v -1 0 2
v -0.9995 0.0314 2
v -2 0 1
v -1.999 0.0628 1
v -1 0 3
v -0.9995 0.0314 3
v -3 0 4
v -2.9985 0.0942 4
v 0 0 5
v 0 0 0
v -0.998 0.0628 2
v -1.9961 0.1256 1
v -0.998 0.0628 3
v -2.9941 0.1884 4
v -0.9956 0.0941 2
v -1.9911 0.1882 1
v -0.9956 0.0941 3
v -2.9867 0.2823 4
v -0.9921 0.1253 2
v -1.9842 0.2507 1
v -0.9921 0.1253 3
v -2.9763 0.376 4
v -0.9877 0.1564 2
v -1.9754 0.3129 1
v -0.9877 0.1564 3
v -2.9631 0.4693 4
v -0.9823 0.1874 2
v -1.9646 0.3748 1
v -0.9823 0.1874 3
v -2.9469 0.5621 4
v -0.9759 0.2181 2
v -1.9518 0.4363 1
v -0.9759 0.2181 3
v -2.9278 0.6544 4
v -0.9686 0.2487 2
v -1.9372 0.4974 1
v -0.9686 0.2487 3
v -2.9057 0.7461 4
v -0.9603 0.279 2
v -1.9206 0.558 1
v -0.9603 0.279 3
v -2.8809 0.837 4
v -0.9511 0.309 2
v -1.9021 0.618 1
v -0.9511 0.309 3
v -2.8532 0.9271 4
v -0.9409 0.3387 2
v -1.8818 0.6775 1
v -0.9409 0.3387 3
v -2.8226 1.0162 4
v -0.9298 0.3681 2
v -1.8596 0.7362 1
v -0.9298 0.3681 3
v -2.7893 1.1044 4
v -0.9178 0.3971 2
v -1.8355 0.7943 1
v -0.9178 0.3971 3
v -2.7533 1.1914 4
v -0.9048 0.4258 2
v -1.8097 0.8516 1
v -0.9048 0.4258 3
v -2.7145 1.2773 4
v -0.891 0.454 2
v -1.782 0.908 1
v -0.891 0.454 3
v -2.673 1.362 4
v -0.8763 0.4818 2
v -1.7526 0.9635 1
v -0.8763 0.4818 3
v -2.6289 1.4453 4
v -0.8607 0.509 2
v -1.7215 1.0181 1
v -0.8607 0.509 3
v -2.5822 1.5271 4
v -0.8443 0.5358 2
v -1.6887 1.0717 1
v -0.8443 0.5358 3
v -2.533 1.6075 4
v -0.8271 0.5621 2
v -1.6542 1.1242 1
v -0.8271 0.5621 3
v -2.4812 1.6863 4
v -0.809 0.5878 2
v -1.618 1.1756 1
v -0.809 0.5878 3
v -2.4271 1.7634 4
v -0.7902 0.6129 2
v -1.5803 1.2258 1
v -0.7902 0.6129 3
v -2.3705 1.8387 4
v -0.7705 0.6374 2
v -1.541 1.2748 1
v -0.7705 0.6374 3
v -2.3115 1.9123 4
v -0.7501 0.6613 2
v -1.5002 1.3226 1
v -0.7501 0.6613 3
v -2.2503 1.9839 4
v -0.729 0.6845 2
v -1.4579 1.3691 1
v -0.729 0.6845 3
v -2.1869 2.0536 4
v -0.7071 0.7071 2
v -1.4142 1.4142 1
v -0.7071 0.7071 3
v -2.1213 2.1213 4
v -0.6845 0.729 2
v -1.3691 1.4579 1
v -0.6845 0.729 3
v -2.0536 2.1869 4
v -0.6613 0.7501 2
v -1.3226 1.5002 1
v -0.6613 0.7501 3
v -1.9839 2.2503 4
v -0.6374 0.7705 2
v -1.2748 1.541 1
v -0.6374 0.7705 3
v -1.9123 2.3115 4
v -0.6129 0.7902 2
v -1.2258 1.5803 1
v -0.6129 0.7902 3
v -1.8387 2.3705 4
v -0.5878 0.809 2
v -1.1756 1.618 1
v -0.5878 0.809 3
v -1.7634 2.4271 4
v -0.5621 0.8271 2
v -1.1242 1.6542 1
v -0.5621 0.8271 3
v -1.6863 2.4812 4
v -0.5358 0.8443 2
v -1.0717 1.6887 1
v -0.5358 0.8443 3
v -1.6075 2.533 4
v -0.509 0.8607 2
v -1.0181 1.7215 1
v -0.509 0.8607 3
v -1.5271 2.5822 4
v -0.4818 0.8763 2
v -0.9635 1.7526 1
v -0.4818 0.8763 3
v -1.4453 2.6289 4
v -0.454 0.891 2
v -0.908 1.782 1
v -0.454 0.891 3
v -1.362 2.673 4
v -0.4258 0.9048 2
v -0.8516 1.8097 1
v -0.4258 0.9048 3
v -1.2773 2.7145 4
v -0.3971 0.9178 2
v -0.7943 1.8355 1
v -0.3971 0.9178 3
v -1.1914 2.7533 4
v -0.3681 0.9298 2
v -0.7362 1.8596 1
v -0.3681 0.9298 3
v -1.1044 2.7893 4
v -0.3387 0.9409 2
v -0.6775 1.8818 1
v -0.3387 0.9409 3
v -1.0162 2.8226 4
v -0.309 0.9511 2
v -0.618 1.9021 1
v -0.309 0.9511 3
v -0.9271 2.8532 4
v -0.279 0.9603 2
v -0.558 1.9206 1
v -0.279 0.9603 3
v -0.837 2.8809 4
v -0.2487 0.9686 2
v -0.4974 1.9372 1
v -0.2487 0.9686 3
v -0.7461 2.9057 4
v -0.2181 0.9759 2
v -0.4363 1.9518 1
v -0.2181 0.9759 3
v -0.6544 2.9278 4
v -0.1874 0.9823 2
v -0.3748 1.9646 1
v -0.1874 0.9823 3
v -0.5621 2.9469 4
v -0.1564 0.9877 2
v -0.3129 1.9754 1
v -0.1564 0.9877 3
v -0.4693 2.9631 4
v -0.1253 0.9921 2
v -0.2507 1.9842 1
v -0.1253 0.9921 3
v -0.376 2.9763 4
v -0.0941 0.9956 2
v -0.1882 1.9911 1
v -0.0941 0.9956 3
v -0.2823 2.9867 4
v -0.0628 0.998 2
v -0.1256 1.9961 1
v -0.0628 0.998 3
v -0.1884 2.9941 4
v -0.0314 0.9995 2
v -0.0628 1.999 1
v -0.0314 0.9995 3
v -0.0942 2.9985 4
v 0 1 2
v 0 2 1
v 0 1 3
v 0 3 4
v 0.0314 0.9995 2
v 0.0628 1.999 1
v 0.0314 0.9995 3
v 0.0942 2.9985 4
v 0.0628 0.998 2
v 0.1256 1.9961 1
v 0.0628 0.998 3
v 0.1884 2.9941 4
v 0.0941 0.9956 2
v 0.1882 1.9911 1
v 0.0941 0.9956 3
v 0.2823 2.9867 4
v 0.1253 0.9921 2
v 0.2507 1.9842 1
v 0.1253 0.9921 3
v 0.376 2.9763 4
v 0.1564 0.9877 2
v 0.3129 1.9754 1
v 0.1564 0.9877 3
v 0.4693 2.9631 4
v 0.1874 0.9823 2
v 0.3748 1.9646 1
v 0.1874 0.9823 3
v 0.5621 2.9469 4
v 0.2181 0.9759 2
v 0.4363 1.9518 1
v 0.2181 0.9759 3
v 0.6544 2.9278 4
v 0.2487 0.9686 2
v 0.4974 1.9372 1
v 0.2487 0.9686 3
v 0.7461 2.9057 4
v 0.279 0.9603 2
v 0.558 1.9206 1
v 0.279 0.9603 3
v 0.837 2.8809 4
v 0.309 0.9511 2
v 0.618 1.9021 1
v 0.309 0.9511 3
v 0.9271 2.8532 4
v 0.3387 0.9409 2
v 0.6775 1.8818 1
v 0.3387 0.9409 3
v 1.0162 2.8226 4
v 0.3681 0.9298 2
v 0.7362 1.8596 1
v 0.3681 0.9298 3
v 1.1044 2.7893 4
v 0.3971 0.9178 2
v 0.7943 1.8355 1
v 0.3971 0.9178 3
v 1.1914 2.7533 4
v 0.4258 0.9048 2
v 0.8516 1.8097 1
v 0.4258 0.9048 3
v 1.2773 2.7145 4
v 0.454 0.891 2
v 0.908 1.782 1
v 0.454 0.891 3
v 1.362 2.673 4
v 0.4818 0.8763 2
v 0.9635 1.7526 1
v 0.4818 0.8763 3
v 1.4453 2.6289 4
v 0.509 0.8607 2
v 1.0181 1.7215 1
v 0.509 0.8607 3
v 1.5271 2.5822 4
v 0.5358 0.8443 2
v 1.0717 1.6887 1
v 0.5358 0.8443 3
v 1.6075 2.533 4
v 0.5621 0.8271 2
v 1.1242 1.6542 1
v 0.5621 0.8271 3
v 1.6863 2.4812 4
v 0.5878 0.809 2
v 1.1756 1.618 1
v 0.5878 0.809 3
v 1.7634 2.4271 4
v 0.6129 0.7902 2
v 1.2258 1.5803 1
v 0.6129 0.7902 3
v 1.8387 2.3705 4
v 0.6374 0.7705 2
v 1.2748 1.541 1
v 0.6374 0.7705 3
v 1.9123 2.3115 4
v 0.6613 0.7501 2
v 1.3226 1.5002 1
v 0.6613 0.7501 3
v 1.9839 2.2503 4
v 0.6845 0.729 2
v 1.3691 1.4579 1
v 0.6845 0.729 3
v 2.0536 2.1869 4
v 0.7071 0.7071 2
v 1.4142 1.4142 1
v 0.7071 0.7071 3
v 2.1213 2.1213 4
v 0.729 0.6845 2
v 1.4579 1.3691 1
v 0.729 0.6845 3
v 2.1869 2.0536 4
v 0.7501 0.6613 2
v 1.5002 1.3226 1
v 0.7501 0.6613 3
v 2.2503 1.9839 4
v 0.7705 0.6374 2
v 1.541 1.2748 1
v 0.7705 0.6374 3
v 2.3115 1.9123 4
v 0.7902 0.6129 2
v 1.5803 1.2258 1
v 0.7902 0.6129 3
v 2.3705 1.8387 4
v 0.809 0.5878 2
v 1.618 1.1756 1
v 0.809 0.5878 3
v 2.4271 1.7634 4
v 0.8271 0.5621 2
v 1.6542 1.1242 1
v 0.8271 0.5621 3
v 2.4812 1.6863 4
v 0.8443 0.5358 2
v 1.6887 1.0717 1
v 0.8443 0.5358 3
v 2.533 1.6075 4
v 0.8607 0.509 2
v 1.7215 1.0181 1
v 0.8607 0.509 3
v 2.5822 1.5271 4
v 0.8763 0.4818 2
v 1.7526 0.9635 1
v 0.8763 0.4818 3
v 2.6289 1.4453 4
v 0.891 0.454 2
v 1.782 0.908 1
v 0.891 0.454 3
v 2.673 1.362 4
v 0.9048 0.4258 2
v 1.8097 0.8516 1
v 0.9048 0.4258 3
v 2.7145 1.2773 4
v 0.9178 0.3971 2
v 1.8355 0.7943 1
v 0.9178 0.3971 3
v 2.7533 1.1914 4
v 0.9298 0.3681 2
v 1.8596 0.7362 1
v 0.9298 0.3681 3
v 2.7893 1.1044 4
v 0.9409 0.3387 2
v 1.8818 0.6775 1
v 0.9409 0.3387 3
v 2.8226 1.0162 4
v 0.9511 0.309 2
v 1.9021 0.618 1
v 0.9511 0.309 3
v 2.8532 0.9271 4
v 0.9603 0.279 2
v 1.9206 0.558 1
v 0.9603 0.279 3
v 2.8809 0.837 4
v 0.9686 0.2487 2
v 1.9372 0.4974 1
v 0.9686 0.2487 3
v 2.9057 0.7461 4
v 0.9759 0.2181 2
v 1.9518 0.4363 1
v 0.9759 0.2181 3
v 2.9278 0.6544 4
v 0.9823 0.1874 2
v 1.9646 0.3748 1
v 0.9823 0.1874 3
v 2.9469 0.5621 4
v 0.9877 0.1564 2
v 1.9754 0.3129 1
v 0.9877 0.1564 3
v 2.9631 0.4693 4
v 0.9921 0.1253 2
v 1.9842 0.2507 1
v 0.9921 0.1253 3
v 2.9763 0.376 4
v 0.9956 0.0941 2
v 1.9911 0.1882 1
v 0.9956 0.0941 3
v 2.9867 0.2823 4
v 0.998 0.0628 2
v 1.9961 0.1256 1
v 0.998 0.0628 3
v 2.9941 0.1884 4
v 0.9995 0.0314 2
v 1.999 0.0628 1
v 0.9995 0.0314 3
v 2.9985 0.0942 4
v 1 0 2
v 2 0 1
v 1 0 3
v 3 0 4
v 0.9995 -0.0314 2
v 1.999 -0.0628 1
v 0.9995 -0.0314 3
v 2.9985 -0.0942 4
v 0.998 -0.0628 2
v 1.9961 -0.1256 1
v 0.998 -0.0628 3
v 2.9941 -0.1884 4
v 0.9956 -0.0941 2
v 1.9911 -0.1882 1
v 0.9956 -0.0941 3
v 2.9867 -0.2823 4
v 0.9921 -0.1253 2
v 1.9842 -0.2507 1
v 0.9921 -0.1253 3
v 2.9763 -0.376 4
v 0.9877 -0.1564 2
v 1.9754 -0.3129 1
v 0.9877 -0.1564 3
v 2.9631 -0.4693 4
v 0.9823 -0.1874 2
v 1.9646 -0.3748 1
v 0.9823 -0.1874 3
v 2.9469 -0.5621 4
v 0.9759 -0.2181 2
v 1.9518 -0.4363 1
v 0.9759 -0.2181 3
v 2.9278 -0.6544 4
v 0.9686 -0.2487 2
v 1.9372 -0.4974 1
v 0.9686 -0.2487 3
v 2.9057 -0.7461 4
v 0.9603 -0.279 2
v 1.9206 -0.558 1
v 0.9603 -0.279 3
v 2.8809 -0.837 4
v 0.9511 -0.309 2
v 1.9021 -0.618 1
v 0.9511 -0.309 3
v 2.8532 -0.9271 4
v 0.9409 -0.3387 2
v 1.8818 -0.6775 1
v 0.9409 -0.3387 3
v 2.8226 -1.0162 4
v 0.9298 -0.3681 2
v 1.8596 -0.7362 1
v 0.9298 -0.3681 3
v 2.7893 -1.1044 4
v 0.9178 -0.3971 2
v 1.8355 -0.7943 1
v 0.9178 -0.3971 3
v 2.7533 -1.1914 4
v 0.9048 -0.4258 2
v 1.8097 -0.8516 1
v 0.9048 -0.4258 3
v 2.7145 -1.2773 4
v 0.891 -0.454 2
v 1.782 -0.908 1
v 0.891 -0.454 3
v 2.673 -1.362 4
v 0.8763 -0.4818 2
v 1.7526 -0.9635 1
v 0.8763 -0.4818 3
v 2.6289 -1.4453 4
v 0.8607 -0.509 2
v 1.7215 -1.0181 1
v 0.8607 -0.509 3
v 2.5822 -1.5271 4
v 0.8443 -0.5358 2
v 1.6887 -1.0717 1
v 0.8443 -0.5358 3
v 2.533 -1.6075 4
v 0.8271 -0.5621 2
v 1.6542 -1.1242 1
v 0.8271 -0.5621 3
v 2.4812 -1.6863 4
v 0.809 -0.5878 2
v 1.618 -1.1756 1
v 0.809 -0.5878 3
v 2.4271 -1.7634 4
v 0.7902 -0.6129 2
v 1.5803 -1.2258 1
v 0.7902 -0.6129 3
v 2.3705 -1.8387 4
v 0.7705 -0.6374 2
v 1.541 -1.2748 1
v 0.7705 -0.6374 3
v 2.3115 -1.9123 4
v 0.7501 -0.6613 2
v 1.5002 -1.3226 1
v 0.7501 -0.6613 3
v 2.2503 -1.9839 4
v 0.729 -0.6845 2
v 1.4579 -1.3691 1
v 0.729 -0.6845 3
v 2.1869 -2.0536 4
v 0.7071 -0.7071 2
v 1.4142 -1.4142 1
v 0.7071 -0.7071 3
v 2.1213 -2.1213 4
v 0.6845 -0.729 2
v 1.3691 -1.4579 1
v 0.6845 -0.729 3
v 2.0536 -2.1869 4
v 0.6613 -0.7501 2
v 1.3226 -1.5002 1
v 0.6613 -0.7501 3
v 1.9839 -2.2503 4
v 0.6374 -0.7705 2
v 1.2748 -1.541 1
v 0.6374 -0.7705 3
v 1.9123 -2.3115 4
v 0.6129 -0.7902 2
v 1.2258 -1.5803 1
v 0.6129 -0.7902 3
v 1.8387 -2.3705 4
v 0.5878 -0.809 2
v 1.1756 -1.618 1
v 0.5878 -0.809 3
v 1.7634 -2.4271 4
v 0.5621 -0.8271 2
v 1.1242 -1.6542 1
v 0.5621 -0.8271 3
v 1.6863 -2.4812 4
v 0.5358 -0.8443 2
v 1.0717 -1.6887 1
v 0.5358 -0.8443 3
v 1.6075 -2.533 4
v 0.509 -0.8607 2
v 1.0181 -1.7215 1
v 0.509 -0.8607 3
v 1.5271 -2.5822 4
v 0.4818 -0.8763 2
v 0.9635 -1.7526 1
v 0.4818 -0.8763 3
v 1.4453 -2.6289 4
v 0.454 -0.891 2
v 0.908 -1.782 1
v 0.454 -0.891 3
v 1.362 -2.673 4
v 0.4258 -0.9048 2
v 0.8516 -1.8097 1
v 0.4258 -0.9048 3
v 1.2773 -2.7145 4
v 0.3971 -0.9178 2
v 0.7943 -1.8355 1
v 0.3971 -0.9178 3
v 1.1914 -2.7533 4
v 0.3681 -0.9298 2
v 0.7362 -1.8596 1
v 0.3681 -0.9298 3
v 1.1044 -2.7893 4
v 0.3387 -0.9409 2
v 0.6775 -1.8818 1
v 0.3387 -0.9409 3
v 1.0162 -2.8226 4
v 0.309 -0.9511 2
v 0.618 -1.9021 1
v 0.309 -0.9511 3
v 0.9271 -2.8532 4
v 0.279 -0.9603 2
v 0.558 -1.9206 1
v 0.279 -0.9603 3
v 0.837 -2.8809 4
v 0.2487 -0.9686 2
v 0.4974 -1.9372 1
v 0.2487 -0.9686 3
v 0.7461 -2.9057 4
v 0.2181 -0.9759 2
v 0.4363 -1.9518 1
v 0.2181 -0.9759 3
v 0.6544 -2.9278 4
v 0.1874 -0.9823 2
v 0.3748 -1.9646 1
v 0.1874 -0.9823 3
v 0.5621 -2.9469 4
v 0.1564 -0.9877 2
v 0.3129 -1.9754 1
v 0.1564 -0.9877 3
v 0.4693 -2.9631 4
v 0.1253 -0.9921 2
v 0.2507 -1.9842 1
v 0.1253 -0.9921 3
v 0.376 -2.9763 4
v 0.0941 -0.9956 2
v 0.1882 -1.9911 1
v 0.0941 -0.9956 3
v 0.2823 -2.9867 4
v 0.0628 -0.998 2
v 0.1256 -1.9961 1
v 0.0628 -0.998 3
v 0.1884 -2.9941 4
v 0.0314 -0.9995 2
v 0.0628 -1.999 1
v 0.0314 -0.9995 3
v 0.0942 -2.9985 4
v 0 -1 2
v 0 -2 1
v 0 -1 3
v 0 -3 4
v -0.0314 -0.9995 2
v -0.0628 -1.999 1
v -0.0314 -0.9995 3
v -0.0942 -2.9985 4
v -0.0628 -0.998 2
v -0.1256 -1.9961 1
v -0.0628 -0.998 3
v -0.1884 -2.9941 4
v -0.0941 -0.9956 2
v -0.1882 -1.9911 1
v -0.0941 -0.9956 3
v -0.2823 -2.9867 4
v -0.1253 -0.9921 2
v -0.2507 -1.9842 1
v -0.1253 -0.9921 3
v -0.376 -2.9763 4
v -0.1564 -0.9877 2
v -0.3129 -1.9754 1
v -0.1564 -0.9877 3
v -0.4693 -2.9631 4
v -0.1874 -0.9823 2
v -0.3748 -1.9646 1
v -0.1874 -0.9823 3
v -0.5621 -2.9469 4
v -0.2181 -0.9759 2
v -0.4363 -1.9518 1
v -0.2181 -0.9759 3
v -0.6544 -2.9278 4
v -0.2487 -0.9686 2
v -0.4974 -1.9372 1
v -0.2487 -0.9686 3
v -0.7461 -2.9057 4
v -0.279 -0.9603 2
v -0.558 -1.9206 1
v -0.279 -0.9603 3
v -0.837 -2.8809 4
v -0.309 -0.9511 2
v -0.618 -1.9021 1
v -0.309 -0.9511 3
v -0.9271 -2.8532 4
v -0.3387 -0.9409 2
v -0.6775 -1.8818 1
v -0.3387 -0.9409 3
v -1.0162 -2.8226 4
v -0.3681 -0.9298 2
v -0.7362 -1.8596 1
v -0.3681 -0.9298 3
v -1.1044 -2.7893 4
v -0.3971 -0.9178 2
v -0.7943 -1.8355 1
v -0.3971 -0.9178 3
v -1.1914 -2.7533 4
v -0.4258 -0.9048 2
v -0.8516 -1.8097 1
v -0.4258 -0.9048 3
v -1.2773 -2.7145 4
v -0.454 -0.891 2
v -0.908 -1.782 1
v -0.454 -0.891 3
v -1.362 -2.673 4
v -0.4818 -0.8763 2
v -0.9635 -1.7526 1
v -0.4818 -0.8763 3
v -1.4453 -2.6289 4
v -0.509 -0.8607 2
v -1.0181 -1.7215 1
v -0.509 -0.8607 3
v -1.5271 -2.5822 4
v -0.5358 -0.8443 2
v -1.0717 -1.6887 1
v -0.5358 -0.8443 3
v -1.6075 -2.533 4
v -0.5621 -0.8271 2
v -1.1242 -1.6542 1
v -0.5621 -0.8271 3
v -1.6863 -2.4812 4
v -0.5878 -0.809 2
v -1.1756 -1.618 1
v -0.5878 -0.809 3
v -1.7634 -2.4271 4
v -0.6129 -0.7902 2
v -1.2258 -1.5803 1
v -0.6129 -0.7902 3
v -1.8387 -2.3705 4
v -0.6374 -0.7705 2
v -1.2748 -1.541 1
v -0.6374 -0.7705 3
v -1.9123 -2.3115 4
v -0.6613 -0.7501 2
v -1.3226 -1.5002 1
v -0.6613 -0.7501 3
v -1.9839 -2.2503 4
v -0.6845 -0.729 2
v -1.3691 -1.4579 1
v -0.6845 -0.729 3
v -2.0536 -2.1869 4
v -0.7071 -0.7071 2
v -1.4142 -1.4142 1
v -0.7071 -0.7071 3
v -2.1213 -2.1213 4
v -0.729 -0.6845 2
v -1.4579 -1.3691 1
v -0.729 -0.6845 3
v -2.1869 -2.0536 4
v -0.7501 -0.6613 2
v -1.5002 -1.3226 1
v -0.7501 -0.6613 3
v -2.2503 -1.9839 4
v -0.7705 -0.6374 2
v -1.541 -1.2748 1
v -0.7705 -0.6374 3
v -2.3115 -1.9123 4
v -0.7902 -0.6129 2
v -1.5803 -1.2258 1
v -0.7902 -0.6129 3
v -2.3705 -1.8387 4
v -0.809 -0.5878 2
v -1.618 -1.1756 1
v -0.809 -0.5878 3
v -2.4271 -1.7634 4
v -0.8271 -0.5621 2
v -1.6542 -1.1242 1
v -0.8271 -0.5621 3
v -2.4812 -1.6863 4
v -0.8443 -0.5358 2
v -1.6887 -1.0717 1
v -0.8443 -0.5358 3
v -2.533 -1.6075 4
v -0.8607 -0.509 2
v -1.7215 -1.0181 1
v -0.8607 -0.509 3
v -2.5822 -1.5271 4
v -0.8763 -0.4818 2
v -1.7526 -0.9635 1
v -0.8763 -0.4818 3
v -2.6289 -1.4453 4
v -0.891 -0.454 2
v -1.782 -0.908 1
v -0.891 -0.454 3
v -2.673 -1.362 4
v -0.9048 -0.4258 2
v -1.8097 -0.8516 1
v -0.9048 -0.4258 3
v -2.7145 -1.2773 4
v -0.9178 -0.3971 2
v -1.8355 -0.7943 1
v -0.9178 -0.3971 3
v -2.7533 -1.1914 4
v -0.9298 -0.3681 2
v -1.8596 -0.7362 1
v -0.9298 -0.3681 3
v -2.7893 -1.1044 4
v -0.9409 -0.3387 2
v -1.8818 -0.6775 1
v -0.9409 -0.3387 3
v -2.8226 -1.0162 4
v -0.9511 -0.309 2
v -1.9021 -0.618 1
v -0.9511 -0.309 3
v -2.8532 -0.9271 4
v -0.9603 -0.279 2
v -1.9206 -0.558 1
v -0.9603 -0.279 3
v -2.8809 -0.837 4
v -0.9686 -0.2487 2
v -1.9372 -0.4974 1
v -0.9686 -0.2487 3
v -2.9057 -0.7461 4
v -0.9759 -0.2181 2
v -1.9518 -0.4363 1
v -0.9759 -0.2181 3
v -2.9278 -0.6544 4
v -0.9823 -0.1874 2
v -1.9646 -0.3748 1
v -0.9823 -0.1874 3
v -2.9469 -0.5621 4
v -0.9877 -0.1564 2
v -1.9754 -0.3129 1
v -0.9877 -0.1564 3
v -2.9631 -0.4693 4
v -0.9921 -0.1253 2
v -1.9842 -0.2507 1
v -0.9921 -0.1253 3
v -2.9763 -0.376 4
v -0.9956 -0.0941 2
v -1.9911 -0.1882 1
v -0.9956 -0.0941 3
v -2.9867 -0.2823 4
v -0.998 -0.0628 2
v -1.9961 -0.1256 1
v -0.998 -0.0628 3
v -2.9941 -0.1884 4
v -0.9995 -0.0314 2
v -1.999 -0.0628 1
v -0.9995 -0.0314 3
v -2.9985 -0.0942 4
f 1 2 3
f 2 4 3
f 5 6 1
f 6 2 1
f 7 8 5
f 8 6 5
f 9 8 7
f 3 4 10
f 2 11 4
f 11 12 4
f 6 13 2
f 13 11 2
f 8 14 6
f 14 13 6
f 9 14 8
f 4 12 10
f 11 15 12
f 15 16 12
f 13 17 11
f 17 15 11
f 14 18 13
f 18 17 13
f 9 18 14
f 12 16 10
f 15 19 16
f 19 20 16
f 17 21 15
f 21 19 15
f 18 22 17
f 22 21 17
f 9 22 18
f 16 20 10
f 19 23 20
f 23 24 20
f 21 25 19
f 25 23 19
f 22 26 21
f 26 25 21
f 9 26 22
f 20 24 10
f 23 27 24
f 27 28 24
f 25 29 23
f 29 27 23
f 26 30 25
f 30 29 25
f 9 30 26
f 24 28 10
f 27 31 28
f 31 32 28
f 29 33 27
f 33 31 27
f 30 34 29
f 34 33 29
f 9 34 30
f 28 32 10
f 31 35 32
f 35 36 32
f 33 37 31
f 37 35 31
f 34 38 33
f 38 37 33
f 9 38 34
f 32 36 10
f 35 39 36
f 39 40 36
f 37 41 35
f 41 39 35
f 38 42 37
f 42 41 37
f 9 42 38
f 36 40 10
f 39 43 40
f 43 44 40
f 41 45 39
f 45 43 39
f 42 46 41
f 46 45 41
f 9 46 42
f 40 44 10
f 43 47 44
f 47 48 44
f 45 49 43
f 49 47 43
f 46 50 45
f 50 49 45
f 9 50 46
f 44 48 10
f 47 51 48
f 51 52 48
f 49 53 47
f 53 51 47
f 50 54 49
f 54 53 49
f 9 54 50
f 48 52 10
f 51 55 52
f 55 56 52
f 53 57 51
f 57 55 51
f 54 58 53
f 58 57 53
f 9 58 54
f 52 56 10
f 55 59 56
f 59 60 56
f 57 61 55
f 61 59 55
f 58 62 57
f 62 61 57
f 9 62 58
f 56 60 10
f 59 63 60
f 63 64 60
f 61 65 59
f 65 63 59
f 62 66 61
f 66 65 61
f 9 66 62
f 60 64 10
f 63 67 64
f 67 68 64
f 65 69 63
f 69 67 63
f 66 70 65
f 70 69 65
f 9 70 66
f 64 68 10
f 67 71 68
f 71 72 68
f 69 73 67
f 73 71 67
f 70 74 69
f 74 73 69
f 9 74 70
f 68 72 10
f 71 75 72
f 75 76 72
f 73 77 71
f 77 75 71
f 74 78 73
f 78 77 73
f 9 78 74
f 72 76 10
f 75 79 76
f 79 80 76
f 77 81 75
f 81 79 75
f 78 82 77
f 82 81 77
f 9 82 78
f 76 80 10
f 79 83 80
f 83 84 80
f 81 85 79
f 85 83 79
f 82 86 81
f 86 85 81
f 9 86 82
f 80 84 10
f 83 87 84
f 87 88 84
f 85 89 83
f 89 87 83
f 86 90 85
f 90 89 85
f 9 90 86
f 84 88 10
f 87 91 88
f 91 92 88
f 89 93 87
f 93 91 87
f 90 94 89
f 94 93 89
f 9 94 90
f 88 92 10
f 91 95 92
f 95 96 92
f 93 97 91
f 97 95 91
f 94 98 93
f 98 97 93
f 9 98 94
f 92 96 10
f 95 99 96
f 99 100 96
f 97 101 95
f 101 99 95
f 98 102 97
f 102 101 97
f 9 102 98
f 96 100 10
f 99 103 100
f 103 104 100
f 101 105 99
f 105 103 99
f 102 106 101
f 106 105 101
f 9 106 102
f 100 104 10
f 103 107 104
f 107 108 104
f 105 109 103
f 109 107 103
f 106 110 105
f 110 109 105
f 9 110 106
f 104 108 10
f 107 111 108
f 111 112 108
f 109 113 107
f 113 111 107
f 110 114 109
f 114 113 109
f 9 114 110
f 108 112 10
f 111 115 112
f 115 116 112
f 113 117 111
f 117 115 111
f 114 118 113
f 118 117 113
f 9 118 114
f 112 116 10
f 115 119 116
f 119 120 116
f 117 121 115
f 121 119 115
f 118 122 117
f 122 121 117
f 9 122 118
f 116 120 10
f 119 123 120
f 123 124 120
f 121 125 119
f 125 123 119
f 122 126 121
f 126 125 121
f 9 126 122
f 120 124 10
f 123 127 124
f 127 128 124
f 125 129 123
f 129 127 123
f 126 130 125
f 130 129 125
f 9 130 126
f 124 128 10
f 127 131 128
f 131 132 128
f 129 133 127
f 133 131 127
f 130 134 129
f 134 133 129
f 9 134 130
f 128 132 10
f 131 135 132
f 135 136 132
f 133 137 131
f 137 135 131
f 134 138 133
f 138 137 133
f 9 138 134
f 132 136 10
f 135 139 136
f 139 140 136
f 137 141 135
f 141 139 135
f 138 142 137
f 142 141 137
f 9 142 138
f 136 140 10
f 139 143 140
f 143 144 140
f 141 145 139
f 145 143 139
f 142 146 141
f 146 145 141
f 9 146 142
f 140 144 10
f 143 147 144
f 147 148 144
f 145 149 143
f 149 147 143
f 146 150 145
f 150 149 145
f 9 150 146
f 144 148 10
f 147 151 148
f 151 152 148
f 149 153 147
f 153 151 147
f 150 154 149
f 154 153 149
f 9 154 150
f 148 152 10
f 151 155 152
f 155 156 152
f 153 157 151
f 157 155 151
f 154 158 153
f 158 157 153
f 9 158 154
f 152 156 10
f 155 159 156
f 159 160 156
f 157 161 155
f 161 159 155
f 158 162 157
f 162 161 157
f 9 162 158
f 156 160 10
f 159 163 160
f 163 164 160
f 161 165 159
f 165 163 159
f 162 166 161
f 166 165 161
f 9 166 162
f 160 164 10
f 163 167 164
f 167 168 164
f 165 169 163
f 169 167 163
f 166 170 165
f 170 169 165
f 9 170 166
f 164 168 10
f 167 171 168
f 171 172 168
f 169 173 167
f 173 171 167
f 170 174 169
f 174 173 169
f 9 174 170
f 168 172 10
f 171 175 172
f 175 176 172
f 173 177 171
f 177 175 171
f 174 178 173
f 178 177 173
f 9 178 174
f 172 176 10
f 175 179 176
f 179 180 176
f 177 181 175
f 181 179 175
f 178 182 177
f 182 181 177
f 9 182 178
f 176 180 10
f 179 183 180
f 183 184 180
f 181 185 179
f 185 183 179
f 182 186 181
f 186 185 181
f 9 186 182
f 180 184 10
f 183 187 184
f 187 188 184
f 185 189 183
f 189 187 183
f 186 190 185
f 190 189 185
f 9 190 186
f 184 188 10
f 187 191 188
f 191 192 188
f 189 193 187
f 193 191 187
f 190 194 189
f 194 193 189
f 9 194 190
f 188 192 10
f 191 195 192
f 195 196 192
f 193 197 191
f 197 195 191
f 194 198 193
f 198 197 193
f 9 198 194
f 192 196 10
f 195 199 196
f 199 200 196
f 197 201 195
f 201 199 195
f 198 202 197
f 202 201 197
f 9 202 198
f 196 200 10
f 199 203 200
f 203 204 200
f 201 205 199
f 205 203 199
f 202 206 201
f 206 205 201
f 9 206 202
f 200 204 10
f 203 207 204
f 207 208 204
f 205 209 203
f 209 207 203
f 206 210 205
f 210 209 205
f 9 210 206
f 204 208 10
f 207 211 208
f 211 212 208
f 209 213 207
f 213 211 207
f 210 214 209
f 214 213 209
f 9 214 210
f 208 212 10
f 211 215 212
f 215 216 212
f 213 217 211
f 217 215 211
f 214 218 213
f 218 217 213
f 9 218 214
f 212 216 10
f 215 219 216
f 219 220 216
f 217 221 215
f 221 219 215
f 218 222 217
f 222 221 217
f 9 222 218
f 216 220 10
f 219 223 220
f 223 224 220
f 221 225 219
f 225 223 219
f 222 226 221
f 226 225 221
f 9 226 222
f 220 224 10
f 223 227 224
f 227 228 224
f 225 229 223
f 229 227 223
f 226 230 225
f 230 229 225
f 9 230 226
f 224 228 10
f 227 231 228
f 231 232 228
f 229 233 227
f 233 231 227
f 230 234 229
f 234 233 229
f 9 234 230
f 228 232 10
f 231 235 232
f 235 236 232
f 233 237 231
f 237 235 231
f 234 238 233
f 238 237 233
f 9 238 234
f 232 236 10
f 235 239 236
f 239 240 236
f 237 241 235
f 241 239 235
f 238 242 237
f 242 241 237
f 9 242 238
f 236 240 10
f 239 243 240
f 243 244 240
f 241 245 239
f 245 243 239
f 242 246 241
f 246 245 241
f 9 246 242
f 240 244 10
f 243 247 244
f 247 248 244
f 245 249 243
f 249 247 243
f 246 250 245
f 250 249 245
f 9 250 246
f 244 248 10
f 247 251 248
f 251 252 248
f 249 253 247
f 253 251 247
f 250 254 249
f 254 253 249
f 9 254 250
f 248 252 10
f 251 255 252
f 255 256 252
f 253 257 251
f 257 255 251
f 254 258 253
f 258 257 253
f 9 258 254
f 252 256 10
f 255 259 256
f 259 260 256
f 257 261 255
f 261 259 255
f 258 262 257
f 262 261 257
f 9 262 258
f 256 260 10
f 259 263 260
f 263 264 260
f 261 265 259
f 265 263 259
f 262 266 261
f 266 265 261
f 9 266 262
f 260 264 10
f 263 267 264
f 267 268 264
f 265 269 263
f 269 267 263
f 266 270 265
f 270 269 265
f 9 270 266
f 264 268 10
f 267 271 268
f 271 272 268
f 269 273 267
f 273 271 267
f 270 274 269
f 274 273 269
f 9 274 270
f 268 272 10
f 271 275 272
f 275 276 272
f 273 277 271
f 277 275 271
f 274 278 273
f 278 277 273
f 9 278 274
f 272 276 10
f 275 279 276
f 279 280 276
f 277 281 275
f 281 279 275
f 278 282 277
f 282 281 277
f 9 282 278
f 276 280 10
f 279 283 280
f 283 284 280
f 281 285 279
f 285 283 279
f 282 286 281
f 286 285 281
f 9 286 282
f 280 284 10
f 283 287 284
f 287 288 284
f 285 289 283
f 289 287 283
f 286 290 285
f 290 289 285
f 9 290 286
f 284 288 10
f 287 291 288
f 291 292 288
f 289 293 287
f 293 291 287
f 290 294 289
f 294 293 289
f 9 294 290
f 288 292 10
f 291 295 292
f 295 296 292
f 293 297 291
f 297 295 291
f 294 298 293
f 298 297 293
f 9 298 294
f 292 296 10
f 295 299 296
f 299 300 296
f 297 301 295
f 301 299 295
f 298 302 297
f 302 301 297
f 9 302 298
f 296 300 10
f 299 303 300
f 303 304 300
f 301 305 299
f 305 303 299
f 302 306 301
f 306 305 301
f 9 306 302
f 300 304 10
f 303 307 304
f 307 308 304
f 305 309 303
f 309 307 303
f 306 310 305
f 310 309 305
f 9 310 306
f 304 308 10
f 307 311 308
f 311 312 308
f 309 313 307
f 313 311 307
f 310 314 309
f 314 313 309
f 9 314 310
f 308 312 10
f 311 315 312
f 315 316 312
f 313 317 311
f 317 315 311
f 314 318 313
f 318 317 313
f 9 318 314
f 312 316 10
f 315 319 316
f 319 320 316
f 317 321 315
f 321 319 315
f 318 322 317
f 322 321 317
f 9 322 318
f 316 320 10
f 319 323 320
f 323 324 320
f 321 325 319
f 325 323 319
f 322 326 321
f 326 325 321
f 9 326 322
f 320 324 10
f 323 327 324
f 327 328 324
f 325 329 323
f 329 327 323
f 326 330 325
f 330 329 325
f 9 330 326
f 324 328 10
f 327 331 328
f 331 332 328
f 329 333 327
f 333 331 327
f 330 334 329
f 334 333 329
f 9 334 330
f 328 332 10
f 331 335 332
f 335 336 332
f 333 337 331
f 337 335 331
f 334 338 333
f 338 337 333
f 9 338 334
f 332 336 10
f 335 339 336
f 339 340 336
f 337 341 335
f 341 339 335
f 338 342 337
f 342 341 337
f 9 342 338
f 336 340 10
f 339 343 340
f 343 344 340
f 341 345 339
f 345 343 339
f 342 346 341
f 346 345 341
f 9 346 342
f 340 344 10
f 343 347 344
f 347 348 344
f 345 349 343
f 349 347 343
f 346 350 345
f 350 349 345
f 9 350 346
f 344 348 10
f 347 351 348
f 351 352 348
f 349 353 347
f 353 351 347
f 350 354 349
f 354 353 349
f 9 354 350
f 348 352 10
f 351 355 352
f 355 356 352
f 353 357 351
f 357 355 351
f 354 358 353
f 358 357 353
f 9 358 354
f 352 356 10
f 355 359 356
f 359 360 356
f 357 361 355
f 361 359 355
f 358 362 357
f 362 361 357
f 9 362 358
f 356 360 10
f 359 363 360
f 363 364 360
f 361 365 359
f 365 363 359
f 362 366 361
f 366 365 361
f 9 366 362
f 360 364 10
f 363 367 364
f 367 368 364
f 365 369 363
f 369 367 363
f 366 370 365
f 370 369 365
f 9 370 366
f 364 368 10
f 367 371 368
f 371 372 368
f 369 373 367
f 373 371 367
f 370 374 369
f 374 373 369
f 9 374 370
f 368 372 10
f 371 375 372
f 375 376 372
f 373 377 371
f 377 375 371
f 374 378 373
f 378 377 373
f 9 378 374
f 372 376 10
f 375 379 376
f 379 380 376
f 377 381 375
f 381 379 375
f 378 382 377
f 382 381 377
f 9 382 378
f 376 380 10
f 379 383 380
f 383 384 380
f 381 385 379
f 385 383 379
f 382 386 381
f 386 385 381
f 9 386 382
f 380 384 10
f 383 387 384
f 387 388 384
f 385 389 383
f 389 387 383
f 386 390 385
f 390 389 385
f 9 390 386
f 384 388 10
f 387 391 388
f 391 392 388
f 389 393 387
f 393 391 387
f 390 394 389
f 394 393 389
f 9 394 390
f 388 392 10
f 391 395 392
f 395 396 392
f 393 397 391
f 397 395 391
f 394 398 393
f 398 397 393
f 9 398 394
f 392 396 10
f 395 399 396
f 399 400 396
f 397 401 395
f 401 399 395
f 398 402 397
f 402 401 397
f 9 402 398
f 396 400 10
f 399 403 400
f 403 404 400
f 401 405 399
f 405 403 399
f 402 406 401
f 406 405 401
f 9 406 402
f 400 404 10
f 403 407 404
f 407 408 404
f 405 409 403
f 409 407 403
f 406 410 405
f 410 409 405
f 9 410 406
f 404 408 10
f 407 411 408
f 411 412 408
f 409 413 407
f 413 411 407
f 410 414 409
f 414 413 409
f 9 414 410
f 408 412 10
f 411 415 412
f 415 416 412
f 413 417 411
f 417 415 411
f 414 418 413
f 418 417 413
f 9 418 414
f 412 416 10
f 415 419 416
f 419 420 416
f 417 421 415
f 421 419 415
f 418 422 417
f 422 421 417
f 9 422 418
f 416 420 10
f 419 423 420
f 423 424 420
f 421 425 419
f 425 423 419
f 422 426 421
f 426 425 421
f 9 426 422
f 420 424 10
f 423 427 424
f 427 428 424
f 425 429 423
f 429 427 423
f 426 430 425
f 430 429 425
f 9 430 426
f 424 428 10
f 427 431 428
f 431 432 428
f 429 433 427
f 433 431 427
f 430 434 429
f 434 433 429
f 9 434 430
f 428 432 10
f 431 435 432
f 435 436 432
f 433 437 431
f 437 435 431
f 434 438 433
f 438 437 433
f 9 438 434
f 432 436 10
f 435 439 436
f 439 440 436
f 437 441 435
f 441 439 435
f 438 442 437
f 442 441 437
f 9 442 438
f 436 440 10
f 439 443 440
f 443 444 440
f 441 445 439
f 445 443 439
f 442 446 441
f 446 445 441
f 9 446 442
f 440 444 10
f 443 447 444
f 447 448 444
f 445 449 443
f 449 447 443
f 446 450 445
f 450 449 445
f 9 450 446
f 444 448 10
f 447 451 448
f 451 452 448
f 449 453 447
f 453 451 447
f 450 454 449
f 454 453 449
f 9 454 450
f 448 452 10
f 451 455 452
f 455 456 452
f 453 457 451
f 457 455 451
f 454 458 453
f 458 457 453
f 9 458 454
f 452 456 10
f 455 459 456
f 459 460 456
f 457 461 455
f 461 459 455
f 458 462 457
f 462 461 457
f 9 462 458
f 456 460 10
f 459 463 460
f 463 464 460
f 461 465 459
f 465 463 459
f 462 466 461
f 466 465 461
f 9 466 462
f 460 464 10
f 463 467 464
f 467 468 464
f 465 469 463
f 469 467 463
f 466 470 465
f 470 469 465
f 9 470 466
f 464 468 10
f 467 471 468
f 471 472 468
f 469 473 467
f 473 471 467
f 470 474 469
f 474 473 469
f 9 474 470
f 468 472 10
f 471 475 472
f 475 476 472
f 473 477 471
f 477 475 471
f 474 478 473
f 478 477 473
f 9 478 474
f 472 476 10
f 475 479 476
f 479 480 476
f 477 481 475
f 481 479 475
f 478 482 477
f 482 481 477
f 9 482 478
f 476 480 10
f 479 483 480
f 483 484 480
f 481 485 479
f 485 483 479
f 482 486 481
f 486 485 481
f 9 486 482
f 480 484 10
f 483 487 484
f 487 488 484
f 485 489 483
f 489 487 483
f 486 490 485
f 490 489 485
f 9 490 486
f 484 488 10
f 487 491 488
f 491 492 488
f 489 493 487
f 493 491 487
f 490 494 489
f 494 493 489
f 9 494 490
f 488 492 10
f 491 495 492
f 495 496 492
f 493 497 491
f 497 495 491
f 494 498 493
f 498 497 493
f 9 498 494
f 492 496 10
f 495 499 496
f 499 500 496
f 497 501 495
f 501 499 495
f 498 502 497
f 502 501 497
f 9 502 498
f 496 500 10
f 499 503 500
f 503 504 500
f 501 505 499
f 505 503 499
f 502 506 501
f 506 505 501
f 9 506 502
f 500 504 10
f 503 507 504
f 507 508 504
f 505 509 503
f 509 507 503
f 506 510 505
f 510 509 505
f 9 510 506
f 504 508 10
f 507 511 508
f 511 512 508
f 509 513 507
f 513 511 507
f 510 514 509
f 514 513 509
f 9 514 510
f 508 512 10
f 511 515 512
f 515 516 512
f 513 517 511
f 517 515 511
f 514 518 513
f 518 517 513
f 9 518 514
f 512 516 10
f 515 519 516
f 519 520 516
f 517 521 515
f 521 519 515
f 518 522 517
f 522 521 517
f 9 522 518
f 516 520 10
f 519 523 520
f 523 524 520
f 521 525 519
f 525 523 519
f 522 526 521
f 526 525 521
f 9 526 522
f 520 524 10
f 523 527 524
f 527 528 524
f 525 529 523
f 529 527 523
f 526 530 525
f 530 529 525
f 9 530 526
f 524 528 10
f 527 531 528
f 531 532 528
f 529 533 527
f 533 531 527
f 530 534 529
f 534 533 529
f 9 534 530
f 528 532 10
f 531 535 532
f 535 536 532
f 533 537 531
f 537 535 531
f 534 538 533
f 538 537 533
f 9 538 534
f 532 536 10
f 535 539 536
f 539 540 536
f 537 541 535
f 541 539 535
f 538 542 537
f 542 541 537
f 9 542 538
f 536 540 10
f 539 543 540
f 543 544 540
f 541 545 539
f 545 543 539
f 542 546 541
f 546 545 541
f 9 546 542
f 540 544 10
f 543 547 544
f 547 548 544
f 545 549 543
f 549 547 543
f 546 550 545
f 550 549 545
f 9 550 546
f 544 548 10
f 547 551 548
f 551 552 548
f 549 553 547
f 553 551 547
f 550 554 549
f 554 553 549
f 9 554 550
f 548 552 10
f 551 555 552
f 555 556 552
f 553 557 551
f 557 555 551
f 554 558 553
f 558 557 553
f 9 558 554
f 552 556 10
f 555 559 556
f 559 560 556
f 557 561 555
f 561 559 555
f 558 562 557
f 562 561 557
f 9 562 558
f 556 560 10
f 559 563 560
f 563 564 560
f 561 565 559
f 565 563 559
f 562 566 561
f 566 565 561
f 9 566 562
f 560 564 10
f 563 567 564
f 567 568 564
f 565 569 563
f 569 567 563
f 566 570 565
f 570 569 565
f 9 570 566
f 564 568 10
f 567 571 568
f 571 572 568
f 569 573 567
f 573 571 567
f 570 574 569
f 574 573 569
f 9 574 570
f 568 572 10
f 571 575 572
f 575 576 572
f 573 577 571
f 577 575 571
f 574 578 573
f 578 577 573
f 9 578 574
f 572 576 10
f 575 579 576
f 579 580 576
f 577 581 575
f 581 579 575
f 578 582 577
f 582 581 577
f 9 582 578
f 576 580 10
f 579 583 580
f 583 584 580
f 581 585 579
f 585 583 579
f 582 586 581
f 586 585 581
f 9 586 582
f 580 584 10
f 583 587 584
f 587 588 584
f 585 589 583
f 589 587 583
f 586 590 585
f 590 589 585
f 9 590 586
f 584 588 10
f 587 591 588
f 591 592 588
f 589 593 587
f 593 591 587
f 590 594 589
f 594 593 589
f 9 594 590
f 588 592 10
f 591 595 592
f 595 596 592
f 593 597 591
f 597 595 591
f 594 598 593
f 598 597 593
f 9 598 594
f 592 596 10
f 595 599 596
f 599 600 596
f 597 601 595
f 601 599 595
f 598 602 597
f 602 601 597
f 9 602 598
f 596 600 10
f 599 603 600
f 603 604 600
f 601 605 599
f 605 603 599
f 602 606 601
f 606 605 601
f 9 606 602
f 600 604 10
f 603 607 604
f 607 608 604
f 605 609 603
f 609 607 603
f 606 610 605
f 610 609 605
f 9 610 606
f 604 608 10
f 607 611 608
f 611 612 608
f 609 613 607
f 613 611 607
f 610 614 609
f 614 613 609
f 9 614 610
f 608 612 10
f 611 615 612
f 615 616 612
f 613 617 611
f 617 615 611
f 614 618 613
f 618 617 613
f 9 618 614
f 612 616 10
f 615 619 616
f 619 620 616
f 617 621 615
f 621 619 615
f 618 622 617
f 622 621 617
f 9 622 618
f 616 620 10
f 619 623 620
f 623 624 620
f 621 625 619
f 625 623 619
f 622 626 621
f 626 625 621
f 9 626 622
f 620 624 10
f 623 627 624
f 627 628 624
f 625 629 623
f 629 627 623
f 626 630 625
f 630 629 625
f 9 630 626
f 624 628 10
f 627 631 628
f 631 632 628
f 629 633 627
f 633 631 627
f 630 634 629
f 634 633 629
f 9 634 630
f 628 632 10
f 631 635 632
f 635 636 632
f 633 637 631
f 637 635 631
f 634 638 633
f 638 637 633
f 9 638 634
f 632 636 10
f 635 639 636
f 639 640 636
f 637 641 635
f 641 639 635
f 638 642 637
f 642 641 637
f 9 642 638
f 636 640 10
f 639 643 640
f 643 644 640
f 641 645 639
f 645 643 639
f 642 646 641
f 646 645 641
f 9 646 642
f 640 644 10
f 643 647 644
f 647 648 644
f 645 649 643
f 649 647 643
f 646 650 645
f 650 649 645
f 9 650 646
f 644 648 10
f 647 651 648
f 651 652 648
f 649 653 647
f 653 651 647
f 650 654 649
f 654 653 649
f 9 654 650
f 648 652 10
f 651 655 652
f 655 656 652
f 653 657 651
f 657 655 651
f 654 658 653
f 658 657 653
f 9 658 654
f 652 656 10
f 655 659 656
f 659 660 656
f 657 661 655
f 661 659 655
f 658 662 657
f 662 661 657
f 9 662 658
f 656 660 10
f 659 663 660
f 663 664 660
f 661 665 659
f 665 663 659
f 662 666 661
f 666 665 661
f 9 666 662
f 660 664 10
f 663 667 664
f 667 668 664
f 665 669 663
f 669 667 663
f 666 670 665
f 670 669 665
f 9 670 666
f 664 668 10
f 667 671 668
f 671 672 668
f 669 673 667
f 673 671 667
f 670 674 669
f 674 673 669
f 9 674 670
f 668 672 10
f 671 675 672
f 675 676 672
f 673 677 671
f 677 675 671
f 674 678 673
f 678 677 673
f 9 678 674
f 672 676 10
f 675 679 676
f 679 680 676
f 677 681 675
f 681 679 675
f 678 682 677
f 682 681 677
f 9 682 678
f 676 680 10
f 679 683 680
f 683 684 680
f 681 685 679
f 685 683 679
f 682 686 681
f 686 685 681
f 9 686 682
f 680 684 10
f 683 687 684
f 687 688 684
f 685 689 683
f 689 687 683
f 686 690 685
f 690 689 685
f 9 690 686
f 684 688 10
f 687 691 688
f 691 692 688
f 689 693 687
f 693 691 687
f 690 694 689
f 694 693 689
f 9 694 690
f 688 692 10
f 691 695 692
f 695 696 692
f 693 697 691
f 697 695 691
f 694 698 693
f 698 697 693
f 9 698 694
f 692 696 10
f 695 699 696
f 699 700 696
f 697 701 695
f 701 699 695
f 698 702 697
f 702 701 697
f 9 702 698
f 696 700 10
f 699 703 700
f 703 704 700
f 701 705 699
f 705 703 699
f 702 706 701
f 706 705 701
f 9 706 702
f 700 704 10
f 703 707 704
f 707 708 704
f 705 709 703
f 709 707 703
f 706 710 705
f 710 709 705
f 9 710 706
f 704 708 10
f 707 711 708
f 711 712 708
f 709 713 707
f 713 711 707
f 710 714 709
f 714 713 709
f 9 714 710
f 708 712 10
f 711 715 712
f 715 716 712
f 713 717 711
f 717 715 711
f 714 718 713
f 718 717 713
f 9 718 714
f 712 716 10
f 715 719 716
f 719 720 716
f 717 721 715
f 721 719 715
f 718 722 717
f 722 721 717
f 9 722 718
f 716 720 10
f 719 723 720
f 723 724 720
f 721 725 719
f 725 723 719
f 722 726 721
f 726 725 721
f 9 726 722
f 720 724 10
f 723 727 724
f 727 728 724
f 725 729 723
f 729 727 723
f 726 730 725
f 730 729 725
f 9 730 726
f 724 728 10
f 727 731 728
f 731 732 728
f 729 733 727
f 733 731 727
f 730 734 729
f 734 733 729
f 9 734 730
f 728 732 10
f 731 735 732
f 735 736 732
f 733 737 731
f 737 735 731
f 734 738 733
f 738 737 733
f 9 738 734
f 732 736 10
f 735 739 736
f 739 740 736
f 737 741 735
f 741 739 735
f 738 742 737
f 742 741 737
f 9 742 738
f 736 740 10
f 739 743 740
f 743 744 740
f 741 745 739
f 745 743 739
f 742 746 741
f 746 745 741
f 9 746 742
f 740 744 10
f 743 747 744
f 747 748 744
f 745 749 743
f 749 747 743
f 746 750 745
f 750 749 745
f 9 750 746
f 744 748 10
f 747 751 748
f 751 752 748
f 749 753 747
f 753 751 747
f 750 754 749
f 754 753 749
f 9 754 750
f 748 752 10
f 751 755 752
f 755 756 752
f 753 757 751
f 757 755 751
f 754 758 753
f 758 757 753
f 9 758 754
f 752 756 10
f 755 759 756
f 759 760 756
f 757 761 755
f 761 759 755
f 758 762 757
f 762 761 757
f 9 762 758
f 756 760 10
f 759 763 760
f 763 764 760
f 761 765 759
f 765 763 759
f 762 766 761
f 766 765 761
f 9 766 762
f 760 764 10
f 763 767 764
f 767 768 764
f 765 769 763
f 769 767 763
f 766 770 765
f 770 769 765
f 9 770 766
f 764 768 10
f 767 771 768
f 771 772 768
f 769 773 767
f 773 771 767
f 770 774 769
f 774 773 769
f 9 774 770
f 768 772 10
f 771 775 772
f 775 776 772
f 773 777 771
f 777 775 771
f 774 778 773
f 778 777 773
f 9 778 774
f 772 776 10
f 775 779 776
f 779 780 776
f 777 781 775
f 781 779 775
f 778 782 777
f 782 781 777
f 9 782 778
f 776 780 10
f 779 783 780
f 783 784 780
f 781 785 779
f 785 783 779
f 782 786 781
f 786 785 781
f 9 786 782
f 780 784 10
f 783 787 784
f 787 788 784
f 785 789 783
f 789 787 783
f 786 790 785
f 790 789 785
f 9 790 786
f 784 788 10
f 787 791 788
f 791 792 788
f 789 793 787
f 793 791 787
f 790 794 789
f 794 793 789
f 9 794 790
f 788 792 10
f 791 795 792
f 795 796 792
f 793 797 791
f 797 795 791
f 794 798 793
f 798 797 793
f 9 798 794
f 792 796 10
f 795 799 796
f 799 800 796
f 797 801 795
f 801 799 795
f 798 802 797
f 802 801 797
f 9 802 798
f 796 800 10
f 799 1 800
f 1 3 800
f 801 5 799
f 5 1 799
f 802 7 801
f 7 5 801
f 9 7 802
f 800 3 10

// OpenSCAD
rotate_extrude($fn=200) polygon( points=[[0,0],[2,1],[1,2],[1,3],[3,4],[0,5]] );
